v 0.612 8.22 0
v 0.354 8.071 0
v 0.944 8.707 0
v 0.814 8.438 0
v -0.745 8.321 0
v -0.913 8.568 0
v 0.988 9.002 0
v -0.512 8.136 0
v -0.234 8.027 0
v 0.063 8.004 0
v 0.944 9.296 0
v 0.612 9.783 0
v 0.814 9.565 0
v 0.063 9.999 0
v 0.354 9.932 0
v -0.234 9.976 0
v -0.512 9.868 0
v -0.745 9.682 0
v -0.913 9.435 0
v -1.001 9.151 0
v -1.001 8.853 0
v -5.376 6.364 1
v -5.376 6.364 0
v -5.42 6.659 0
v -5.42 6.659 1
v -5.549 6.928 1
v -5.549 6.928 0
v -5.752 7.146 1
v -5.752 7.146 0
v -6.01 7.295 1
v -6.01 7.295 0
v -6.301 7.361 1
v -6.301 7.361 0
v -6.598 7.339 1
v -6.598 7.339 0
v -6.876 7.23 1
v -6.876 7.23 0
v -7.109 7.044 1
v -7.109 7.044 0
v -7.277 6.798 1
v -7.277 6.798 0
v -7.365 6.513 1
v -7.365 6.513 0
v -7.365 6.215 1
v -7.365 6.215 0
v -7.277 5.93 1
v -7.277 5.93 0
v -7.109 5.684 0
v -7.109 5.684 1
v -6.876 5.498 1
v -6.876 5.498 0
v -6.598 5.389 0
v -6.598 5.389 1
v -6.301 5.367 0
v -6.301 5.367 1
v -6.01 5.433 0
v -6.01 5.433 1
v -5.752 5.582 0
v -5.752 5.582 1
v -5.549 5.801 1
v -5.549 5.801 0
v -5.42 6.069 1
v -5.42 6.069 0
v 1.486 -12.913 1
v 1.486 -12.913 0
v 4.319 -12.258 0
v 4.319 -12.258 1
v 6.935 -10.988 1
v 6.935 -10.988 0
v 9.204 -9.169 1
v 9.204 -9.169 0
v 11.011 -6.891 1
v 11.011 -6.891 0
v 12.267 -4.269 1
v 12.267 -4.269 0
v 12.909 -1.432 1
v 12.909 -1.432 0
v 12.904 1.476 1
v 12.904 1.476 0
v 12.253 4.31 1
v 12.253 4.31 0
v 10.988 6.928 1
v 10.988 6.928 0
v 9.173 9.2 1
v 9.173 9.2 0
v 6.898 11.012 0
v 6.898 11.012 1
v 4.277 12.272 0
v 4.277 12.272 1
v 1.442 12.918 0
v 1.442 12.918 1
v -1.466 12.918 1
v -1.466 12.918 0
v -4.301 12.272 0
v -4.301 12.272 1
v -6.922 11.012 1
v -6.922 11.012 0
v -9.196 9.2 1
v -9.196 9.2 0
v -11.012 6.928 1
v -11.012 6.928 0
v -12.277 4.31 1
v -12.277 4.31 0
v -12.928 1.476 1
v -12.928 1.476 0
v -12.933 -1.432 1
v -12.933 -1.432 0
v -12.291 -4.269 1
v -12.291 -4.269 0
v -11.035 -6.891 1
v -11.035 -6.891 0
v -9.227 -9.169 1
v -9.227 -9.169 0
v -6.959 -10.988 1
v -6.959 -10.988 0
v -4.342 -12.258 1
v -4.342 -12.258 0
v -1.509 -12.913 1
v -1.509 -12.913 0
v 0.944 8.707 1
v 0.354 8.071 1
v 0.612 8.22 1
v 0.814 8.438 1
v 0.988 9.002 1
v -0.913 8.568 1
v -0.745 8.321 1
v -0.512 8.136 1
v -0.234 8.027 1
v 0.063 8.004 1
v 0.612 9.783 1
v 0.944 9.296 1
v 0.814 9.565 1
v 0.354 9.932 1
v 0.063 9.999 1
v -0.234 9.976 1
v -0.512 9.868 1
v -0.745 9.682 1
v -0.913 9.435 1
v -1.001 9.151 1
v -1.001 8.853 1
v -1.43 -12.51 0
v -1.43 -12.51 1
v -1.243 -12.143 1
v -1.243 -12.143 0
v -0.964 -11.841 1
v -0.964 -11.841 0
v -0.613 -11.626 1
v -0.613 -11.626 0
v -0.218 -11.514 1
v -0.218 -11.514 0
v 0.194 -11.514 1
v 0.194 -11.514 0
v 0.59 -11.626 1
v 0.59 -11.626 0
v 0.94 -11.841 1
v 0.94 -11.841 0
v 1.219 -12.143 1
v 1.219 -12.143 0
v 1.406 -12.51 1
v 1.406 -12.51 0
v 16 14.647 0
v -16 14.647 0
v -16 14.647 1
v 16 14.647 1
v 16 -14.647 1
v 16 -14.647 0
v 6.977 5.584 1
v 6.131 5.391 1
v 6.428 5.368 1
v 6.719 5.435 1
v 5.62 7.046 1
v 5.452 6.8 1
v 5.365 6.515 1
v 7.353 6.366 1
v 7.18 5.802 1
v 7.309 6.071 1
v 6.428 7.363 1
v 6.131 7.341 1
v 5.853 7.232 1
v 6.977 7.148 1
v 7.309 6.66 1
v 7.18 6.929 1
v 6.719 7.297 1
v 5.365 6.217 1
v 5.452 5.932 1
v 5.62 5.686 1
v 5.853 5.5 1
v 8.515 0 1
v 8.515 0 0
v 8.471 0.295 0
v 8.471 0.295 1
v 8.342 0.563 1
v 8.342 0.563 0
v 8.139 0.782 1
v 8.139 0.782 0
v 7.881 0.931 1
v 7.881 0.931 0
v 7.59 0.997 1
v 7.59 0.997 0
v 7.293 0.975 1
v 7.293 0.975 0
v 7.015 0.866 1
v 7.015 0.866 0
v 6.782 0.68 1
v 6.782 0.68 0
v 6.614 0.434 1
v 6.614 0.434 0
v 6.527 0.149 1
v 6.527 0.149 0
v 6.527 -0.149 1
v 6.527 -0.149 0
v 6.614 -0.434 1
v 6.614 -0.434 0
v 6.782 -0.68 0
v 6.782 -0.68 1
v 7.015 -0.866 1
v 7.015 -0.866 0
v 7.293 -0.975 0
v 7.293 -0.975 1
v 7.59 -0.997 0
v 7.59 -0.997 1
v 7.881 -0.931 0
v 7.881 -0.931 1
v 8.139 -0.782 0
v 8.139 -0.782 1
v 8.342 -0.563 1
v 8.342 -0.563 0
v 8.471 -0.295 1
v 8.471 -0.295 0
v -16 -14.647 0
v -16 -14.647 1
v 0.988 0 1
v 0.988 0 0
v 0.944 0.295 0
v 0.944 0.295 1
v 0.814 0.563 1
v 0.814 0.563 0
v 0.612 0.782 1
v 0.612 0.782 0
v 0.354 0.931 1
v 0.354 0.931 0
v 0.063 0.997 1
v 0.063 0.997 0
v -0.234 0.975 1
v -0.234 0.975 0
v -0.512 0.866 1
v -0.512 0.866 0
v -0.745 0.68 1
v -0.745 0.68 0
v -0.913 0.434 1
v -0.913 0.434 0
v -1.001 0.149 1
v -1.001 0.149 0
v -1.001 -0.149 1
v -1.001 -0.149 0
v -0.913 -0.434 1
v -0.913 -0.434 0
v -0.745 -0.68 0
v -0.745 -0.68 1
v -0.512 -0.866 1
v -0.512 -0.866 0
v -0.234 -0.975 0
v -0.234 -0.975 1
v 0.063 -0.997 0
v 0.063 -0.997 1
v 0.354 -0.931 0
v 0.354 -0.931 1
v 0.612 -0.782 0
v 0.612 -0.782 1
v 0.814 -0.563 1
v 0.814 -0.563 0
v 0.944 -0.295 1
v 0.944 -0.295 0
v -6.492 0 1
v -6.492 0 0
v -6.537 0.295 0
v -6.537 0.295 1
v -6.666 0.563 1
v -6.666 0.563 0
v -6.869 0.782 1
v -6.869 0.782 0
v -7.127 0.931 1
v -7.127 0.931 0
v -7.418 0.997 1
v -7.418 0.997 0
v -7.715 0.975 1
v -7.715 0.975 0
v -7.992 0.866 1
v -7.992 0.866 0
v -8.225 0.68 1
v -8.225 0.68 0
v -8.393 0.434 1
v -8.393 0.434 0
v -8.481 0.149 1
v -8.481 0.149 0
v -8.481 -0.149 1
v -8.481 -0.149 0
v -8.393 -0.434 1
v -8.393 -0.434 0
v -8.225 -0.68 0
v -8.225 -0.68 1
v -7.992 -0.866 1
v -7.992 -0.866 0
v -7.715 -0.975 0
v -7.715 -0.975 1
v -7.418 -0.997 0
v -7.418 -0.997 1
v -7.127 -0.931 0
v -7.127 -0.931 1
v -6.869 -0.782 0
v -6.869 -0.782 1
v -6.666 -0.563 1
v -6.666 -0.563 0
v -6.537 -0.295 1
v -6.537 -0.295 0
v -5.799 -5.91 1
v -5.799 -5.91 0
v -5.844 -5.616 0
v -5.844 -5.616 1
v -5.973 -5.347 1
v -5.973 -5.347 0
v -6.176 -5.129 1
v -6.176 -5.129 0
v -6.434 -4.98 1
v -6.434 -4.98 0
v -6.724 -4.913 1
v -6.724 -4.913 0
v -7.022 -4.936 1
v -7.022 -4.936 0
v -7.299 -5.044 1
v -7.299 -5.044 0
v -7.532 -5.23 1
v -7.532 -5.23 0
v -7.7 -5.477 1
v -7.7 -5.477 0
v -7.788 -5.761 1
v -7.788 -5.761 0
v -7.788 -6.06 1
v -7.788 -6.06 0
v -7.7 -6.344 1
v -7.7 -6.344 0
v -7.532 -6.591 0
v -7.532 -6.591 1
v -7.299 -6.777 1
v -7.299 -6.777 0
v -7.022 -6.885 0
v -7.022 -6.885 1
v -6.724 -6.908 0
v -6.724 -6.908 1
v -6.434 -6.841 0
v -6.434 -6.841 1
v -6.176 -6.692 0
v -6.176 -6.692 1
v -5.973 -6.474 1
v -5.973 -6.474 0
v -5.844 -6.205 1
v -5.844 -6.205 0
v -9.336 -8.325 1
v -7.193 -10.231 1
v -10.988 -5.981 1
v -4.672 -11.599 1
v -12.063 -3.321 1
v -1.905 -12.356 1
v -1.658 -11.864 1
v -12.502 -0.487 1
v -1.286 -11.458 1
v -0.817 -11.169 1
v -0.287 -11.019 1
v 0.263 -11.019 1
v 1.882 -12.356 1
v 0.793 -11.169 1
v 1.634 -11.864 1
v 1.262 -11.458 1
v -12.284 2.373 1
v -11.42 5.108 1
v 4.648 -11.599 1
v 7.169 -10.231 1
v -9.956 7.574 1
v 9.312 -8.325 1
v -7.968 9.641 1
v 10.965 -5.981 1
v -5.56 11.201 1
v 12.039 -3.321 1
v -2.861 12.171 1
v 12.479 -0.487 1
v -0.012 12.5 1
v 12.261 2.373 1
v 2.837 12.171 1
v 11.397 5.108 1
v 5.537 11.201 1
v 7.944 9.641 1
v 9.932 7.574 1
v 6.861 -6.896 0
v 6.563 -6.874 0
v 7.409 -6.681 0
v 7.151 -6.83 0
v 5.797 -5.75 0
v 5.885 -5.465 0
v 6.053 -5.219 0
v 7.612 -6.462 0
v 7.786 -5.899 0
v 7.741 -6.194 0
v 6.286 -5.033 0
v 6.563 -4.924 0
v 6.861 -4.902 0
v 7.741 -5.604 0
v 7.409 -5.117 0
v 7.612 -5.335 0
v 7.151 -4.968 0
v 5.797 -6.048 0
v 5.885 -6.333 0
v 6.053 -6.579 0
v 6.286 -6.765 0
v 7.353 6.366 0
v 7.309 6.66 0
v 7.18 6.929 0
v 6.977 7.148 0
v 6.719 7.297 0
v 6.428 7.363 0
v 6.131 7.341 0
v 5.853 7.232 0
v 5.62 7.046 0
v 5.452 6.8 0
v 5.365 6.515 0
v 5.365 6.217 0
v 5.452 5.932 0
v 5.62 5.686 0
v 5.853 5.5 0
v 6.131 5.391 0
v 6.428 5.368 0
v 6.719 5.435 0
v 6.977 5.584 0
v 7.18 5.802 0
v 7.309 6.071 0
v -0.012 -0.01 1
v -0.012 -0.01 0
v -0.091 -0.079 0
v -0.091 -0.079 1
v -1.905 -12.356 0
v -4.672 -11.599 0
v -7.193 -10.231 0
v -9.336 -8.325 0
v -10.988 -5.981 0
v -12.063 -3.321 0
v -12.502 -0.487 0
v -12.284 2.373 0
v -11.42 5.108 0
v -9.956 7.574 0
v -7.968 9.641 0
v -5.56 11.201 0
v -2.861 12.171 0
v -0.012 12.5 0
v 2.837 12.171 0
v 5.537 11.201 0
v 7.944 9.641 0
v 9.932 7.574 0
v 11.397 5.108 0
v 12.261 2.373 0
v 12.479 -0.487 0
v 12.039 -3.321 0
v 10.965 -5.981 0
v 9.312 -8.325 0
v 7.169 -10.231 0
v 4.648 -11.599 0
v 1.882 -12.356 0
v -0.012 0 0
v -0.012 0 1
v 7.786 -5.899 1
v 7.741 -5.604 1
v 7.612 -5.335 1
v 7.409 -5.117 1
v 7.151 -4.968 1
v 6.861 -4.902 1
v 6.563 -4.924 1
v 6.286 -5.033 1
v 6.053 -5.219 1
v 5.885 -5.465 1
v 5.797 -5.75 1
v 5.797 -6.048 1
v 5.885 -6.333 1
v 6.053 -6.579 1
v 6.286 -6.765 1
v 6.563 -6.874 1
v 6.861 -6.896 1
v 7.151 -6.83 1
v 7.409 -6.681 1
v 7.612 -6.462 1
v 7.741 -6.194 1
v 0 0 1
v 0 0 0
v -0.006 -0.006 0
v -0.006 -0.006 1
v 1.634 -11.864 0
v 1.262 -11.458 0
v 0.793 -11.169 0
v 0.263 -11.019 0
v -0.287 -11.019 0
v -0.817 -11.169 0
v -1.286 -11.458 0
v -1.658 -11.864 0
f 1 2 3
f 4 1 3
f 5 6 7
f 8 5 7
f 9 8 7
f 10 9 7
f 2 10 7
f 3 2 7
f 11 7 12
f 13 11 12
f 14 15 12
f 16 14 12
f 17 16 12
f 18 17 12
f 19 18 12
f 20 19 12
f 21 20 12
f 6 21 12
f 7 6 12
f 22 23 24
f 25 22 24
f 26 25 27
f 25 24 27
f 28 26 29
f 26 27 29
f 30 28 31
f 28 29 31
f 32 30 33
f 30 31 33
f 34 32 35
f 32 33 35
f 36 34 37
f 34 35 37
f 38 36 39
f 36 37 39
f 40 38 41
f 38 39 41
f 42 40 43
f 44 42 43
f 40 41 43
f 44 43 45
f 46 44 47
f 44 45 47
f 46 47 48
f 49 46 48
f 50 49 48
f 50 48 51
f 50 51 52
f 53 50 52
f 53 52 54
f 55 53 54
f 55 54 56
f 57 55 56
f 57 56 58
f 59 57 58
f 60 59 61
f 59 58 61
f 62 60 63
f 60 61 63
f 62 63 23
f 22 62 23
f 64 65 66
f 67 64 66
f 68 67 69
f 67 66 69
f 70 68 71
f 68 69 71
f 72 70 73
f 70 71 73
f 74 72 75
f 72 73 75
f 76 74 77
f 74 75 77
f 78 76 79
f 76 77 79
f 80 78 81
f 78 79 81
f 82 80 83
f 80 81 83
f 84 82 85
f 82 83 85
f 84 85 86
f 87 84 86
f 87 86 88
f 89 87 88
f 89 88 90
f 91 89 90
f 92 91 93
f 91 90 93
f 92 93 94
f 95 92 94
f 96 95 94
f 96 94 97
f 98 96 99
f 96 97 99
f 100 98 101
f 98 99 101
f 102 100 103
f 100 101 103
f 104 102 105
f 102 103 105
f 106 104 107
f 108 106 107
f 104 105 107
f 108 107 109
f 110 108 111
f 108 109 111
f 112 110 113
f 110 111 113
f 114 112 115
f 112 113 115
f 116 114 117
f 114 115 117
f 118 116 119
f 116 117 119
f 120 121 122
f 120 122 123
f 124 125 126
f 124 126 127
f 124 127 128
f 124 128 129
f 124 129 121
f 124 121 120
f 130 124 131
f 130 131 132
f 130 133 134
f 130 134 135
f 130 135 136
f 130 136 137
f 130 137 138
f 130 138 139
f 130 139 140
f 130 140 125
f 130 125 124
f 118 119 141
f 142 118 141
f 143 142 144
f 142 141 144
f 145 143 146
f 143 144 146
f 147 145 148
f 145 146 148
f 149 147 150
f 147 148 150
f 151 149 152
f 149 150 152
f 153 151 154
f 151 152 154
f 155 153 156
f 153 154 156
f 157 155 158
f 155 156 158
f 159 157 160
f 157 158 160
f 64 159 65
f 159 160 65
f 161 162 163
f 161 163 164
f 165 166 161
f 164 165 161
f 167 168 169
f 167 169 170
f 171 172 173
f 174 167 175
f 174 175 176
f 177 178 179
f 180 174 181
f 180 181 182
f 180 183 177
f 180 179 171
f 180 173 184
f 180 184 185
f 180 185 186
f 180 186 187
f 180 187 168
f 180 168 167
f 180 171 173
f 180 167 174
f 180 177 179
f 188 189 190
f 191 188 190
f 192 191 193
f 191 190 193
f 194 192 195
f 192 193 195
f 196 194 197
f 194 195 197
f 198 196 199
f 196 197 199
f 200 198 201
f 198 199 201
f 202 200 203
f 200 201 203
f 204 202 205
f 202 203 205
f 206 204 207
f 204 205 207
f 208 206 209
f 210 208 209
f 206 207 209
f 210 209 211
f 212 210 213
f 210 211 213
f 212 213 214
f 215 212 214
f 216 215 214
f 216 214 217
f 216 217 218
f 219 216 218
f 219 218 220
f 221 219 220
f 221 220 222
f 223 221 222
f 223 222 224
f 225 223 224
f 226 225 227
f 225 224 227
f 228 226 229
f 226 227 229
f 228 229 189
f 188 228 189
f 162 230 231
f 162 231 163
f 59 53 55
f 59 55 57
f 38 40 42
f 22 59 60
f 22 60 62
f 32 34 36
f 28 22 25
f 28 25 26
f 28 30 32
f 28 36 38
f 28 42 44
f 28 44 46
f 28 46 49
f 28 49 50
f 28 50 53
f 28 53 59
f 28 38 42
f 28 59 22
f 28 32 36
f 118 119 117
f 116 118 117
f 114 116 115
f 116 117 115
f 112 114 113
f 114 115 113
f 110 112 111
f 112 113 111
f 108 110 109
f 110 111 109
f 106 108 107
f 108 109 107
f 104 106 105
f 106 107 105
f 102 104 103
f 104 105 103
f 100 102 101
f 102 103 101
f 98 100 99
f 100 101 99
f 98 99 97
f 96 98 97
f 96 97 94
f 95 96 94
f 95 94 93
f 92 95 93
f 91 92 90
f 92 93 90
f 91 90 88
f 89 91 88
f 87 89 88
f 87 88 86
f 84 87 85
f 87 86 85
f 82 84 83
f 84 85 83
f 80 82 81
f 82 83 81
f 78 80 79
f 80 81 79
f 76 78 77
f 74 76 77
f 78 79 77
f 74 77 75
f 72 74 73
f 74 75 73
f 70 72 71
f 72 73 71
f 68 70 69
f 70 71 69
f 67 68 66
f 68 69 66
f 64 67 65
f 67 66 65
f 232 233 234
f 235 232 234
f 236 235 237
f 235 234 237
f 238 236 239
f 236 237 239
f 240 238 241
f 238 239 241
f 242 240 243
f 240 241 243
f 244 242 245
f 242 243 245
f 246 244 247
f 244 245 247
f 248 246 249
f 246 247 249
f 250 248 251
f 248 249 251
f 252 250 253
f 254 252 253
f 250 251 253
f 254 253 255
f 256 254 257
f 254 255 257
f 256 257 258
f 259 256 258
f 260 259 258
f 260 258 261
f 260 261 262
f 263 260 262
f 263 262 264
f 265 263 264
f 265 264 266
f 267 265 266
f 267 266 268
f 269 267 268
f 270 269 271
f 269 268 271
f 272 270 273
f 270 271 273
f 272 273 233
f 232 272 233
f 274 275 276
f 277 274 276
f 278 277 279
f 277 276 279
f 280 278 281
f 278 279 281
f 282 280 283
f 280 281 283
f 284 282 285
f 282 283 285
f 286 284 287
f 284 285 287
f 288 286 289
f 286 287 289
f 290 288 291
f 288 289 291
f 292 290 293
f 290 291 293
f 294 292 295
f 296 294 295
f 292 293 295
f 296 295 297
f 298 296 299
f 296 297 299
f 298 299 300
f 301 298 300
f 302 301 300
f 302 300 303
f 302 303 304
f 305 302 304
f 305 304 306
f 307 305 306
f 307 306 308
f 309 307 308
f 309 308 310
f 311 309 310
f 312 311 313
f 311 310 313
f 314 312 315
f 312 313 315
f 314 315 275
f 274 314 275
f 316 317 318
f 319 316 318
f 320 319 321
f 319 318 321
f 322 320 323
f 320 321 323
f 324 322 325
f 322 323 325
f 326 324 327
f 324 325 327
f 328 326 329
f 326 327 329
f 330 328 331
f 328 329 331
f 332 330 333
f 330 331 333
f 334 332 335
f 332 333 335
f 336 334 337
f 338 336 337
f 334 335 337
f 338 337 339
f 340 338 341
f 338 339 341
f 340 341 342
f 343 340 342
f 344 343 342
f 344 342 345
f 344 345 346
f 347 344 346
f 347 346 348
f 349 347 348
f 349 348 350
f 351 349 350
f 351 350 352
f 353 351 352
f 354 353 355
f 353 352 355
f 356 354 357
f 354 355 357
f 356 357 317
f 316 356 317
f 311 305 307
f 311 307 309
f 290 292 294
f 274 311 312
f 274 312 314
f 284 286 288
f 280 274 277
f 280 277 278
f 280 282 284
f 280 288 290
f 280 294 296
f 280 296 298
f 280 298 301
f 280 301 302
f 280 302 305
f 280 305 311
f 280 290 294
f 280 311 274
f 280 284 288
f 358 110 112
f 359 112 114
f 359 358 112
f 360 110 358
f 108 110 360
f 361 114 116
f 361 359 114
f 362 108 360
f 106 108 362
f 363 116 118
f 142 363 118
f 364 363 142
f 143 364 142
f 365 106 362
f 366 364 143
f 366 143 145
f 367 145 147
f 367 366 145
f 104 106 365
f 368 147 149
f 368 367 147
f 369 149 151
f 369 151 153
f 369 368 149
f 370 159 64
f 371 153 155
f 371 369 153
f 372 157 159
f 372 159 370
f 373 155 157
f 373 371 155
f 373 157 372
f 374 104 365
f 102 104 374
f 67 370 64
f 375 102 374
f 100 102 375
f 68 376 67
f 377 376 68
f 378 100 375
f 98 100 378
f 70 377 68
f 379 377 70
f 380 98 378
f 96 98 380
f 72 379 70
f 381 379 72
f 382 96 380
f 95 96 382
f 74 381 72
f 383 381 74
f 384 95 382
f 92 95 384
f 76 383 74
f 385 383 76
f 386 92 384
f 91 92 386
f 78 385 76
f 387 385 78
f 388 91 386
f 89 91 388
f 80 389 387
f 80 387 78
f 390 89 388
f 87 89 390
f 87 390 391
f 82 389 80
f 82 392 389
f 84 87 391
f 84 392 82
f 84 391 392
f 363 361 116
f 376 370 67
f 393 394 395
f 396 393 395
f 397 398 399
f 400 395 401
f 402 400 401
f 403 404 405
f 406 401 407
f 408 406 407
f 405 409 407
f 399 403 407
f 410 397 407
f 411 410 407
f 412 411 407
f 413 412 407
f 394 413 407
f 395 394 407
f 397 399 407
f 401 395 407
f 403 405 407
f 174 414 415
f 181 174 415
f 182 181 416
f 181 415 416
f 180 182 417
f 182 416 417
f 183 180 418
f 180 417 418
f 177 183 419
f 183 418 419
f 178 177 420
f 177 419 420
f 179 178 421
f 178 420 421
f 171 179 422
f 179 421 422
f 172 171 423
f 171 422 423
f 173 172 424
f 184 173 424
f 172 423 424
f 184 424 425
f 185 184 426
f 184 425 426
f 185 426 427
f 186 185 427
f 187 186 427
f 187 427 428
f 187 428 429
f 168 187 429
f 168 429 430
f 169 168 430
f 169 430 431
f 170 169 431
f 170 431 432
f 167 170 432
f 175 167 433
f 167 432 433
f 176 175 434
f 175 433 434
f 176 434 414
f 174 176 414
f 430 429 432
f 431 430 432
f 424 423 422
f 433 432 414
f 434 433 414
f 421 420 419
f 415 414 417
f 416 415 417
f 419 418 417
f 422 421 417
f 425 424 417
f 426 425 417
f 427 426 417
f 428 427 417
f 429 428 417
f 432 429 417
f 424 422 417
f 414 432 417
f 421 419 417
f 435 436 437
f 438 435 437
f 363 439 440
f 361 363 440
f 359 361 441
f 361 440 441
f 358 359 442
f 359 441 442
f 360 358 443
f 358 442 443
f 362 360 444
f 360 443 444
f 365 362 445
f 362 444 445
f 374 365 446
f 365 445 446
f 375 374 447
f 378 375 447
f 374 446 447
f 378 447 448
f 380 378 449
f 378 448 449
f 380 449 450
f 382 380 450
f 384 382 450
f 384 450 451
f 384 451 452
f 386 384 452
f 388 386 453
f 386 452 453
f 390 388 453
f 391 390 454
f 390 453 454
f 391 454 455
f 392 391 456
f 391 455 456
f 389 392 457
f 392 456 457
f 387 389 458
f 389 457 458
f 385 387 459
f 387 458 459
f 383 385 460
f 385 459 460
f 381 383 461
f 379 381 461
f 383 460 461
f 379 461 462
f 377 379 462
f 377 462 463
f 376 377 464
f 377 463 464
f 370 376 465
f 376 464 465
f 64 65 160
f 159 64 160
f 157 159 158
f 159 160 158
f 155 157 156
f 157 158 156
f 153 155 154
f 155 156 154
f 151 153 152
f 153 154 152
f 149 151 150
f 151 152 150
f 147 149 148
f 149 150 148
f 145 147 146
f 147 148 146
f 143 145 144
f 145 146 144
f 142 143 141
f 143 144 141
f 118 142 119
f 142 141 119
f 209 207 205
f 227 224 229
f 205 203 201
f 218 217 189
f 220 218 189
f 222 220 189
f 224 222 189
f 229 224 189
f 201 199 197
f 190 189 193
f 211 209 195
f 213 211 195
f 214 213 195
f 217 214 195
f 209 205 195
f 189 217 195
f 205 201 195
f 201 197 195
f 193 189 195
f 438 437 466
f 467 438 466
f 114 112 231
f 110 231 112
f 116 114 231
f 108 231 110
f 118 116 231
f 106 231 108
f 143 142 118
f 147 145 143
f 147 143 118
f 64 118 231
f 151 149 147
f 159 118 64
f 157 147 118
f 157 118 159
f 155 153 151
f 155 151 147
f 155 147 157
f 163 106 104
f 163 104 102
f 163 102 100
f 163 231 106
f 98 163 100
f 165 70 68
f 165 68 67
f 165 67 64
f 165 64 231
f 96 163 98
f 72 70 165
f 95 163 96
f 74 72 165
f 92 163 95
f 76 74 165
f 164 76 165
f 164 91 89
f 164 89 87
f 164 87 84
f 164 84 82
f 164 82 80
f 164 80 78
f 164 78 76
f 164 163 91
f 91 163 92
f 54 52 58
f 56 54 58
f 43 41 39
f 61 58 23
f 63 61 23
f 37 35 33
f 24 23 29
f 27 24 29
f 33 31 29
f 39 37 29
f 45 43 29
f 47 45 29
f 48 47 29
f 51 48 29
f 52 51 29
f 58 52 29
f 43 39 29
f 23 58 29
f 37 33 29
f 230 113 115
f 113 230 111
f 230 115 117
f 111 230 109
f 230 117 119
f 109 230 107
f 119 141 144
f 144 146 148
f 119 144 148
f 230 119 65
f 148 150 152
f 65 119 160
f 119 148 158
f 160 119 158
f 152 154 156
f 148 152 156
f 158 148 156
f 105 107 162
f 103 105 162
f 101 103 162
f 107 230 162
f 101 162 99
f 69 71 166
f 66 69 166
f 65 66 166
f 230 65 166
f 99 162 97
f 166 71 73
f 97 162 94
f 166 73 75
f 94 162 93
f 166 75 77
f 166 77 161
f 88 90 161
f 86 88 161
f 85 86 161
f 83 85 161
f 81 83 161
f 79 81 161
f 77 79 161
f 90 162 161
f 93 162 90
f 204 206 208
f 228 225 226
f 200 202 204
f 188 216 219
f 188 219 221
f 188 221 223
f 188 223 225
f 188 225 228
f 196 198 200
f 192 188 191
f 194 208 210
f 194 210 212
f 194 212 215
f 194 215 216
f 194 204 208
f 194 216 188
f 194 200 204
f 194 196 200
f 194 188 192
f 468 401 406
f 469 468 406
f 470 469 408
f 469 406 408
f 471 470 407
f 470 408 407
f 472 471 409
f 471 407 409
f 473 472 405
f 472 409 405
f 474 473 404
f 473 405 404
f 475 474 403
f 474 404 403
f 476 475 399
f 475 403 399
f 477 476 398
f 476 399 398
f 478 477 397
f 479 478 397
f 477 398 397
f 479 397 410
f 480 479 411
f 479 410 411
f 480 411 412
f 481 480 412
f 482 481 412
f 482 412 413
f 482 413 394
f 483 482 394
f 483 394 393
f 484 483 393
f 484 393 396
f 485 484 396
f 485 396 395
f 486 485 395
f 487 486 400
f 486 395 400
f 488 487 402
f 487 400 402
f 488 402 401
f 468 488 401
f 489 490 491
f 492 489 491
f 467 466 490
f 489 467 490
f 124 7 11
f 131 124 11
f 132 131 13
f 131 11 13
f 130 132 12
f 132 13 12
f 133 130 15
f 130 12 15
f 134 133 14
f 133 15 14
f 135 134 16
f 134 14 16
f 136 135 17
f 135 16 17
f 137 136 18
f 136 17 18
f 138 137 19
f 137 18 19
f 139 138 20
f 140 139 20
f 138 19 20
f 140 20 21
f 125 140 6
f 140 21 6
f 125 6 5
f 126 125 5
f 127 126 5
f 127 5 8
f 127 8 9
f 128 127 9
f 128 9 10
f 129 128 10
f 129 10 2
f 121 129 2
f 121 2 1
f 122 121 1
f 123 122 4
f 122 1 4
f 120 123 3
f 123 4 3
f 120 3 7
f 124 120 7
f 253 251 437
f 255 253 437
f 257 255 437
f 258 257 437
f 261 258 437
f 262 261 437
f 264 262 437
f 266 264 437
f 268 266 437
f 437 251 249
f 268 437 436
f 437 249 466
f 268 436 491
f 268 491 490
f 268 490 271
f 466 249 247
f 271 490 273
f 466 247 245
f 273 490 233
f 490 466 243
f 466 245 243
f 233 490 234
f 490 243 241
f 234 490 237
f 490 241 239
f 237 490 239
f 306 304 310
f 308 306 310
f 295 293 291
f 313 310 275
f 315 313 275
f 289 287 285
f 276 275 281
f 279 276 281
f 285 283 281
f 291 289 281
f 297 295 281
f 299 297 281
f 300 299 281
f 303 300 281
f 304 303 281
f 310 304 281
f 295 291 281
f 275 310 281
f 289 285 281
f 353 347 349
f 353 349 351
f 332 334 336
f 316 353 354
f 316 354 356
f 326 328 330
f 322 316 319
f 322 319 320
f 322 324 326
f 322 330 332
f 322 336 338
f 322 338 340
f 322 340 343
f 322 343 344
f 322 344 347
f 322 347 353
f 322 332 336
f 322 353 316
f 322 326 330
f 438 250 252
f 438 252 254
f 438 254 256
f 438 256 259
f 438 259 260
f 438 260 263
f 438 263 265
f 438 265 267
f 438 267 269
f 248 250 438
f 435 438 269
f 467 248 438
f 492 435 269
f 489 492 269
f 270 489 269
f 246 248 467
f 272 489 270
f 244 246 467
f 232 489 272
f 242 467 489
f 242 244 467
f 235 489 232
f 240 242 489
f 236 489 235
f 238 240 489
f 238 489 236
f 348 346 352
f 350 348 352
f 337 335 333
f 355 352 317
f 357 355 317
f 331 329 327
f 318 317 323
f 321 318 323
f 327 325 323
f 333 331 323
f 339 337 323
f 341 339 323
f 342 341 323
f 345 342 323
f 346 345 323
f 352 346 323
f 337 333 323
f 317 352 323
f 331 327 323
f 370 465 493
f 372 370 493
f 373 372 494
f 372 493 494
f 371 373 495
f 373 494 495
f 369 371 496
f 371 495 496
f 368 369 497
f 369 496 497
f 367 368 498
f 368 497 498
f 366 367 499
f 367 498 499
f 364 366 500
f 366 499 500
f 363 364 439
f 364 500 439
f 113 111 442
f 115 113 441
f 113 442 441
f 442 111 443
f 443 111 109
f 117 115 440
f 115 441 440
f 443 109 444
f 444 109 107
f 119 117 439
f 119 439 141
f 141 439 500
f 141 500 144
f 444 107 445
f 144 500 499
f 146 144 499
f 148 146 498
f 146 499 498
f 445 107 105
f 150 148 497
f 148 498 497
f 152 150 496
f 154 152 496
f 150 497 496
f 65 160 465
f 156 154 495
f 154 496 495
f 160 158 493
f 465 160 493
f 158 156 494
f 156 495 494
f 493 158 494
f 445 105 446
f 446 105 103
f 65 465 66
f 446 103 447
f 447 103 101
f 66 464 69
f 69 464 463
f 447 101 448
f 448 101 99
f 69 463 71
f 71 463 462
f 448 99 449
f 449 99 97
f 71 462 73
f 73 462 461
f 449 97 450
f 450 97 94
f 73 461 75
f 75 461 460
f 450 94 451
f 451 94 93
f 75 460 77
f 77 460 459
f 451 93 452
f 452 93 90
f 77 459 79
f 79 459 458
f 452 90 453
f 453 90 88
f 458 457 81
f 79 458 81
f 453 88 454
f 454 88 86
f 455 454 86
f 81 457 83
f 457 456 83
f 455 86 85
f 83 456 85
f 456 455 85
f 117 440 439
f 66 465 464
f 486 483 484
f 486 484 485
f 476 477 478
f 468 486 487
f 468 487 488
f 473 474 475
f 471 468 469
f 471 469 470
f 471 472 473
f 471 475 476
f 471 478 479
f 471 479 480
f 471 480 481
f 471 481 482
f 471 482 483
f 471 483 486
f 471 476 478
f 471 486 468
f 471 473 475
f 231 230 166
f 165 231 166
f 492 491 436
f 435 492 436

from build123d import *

# Parameters (mm, degrees)
F0_R     = 1
F1_DEPTH = 1
F0_W     = 32
F0_H     = 29.29438
F2_DEPTH = 1


with BuildPart() as f1:
    # F0 (on Top) → F1 (new body)
    with BuildSketch(Plane.XY):
        with BuildLine():
            ThreePointArc((-1.50934, -12.913462), (-0.011839, -11.5), (1.485663, -12.913462))
            ThreePointArc((1.485663, -12.913462), (-0.011839, 13), (-1.50934, -12.913462))
        make_face()
        with BuildLine():
            ThreePointArc((-1.905239, -12.355769), (-0.011839, 12.5), (1.881562, -12.355769))
            ThreePointArc((1.881562, -12.355769), (-0.011839, -11), (-1.905239, -12.355769))
        make_face(mode=Mode.SUBTRACT)
        with Locations((-6.799228, -5.910479)):
            Circle(F0_R)
        with Locations((-7.492259, 0)):
            Circle(F0_R)
        with Locations((-6.375692, 6.364225)):
            Circle(F0_R)
        with Locations((-0.011839, 9.001565)):
            Circle(F0_R)
        with Locations((6.353373, 6.365683)):
            Circle(F0_R)
        with Locations((7.51545, 0)):
            Circle(F0_R)
        with Locations((6.785807, -5.898812)):
            Circle(F0_R)
        with Locations((-0.011839, 0)):
            Circle(F0_R)
        Polygon((-0.090569, -0.078731), (-0.011839, 0), (0, 0), (-0.006333, -0.005505), (-0.011839, -0.010291), align=None, mode=Mode.SUBTRACT)
    extrude(amount=F1_DEPTH)


with BuildPart() as f2:
    # F0 (on Top) → F2 (new body)
    with BuildSketch(Plane.XY):
        Rectangle(F0_W, F0_H)
        with BuildLine():
            ThreePointArc((-1.50934, -12.913462), (-0.011839, 13), (1.485663, -12.913462))
            ThreePointArc((1.485663, -12.913462), (-0.011839, -11.5), (-1.50934, -12.913462))
        make_face(mode=Mode.SUBTRACT)
    extrude(amount=F2_DEPTH)


solid = Compound([f1.part, f2.part])
